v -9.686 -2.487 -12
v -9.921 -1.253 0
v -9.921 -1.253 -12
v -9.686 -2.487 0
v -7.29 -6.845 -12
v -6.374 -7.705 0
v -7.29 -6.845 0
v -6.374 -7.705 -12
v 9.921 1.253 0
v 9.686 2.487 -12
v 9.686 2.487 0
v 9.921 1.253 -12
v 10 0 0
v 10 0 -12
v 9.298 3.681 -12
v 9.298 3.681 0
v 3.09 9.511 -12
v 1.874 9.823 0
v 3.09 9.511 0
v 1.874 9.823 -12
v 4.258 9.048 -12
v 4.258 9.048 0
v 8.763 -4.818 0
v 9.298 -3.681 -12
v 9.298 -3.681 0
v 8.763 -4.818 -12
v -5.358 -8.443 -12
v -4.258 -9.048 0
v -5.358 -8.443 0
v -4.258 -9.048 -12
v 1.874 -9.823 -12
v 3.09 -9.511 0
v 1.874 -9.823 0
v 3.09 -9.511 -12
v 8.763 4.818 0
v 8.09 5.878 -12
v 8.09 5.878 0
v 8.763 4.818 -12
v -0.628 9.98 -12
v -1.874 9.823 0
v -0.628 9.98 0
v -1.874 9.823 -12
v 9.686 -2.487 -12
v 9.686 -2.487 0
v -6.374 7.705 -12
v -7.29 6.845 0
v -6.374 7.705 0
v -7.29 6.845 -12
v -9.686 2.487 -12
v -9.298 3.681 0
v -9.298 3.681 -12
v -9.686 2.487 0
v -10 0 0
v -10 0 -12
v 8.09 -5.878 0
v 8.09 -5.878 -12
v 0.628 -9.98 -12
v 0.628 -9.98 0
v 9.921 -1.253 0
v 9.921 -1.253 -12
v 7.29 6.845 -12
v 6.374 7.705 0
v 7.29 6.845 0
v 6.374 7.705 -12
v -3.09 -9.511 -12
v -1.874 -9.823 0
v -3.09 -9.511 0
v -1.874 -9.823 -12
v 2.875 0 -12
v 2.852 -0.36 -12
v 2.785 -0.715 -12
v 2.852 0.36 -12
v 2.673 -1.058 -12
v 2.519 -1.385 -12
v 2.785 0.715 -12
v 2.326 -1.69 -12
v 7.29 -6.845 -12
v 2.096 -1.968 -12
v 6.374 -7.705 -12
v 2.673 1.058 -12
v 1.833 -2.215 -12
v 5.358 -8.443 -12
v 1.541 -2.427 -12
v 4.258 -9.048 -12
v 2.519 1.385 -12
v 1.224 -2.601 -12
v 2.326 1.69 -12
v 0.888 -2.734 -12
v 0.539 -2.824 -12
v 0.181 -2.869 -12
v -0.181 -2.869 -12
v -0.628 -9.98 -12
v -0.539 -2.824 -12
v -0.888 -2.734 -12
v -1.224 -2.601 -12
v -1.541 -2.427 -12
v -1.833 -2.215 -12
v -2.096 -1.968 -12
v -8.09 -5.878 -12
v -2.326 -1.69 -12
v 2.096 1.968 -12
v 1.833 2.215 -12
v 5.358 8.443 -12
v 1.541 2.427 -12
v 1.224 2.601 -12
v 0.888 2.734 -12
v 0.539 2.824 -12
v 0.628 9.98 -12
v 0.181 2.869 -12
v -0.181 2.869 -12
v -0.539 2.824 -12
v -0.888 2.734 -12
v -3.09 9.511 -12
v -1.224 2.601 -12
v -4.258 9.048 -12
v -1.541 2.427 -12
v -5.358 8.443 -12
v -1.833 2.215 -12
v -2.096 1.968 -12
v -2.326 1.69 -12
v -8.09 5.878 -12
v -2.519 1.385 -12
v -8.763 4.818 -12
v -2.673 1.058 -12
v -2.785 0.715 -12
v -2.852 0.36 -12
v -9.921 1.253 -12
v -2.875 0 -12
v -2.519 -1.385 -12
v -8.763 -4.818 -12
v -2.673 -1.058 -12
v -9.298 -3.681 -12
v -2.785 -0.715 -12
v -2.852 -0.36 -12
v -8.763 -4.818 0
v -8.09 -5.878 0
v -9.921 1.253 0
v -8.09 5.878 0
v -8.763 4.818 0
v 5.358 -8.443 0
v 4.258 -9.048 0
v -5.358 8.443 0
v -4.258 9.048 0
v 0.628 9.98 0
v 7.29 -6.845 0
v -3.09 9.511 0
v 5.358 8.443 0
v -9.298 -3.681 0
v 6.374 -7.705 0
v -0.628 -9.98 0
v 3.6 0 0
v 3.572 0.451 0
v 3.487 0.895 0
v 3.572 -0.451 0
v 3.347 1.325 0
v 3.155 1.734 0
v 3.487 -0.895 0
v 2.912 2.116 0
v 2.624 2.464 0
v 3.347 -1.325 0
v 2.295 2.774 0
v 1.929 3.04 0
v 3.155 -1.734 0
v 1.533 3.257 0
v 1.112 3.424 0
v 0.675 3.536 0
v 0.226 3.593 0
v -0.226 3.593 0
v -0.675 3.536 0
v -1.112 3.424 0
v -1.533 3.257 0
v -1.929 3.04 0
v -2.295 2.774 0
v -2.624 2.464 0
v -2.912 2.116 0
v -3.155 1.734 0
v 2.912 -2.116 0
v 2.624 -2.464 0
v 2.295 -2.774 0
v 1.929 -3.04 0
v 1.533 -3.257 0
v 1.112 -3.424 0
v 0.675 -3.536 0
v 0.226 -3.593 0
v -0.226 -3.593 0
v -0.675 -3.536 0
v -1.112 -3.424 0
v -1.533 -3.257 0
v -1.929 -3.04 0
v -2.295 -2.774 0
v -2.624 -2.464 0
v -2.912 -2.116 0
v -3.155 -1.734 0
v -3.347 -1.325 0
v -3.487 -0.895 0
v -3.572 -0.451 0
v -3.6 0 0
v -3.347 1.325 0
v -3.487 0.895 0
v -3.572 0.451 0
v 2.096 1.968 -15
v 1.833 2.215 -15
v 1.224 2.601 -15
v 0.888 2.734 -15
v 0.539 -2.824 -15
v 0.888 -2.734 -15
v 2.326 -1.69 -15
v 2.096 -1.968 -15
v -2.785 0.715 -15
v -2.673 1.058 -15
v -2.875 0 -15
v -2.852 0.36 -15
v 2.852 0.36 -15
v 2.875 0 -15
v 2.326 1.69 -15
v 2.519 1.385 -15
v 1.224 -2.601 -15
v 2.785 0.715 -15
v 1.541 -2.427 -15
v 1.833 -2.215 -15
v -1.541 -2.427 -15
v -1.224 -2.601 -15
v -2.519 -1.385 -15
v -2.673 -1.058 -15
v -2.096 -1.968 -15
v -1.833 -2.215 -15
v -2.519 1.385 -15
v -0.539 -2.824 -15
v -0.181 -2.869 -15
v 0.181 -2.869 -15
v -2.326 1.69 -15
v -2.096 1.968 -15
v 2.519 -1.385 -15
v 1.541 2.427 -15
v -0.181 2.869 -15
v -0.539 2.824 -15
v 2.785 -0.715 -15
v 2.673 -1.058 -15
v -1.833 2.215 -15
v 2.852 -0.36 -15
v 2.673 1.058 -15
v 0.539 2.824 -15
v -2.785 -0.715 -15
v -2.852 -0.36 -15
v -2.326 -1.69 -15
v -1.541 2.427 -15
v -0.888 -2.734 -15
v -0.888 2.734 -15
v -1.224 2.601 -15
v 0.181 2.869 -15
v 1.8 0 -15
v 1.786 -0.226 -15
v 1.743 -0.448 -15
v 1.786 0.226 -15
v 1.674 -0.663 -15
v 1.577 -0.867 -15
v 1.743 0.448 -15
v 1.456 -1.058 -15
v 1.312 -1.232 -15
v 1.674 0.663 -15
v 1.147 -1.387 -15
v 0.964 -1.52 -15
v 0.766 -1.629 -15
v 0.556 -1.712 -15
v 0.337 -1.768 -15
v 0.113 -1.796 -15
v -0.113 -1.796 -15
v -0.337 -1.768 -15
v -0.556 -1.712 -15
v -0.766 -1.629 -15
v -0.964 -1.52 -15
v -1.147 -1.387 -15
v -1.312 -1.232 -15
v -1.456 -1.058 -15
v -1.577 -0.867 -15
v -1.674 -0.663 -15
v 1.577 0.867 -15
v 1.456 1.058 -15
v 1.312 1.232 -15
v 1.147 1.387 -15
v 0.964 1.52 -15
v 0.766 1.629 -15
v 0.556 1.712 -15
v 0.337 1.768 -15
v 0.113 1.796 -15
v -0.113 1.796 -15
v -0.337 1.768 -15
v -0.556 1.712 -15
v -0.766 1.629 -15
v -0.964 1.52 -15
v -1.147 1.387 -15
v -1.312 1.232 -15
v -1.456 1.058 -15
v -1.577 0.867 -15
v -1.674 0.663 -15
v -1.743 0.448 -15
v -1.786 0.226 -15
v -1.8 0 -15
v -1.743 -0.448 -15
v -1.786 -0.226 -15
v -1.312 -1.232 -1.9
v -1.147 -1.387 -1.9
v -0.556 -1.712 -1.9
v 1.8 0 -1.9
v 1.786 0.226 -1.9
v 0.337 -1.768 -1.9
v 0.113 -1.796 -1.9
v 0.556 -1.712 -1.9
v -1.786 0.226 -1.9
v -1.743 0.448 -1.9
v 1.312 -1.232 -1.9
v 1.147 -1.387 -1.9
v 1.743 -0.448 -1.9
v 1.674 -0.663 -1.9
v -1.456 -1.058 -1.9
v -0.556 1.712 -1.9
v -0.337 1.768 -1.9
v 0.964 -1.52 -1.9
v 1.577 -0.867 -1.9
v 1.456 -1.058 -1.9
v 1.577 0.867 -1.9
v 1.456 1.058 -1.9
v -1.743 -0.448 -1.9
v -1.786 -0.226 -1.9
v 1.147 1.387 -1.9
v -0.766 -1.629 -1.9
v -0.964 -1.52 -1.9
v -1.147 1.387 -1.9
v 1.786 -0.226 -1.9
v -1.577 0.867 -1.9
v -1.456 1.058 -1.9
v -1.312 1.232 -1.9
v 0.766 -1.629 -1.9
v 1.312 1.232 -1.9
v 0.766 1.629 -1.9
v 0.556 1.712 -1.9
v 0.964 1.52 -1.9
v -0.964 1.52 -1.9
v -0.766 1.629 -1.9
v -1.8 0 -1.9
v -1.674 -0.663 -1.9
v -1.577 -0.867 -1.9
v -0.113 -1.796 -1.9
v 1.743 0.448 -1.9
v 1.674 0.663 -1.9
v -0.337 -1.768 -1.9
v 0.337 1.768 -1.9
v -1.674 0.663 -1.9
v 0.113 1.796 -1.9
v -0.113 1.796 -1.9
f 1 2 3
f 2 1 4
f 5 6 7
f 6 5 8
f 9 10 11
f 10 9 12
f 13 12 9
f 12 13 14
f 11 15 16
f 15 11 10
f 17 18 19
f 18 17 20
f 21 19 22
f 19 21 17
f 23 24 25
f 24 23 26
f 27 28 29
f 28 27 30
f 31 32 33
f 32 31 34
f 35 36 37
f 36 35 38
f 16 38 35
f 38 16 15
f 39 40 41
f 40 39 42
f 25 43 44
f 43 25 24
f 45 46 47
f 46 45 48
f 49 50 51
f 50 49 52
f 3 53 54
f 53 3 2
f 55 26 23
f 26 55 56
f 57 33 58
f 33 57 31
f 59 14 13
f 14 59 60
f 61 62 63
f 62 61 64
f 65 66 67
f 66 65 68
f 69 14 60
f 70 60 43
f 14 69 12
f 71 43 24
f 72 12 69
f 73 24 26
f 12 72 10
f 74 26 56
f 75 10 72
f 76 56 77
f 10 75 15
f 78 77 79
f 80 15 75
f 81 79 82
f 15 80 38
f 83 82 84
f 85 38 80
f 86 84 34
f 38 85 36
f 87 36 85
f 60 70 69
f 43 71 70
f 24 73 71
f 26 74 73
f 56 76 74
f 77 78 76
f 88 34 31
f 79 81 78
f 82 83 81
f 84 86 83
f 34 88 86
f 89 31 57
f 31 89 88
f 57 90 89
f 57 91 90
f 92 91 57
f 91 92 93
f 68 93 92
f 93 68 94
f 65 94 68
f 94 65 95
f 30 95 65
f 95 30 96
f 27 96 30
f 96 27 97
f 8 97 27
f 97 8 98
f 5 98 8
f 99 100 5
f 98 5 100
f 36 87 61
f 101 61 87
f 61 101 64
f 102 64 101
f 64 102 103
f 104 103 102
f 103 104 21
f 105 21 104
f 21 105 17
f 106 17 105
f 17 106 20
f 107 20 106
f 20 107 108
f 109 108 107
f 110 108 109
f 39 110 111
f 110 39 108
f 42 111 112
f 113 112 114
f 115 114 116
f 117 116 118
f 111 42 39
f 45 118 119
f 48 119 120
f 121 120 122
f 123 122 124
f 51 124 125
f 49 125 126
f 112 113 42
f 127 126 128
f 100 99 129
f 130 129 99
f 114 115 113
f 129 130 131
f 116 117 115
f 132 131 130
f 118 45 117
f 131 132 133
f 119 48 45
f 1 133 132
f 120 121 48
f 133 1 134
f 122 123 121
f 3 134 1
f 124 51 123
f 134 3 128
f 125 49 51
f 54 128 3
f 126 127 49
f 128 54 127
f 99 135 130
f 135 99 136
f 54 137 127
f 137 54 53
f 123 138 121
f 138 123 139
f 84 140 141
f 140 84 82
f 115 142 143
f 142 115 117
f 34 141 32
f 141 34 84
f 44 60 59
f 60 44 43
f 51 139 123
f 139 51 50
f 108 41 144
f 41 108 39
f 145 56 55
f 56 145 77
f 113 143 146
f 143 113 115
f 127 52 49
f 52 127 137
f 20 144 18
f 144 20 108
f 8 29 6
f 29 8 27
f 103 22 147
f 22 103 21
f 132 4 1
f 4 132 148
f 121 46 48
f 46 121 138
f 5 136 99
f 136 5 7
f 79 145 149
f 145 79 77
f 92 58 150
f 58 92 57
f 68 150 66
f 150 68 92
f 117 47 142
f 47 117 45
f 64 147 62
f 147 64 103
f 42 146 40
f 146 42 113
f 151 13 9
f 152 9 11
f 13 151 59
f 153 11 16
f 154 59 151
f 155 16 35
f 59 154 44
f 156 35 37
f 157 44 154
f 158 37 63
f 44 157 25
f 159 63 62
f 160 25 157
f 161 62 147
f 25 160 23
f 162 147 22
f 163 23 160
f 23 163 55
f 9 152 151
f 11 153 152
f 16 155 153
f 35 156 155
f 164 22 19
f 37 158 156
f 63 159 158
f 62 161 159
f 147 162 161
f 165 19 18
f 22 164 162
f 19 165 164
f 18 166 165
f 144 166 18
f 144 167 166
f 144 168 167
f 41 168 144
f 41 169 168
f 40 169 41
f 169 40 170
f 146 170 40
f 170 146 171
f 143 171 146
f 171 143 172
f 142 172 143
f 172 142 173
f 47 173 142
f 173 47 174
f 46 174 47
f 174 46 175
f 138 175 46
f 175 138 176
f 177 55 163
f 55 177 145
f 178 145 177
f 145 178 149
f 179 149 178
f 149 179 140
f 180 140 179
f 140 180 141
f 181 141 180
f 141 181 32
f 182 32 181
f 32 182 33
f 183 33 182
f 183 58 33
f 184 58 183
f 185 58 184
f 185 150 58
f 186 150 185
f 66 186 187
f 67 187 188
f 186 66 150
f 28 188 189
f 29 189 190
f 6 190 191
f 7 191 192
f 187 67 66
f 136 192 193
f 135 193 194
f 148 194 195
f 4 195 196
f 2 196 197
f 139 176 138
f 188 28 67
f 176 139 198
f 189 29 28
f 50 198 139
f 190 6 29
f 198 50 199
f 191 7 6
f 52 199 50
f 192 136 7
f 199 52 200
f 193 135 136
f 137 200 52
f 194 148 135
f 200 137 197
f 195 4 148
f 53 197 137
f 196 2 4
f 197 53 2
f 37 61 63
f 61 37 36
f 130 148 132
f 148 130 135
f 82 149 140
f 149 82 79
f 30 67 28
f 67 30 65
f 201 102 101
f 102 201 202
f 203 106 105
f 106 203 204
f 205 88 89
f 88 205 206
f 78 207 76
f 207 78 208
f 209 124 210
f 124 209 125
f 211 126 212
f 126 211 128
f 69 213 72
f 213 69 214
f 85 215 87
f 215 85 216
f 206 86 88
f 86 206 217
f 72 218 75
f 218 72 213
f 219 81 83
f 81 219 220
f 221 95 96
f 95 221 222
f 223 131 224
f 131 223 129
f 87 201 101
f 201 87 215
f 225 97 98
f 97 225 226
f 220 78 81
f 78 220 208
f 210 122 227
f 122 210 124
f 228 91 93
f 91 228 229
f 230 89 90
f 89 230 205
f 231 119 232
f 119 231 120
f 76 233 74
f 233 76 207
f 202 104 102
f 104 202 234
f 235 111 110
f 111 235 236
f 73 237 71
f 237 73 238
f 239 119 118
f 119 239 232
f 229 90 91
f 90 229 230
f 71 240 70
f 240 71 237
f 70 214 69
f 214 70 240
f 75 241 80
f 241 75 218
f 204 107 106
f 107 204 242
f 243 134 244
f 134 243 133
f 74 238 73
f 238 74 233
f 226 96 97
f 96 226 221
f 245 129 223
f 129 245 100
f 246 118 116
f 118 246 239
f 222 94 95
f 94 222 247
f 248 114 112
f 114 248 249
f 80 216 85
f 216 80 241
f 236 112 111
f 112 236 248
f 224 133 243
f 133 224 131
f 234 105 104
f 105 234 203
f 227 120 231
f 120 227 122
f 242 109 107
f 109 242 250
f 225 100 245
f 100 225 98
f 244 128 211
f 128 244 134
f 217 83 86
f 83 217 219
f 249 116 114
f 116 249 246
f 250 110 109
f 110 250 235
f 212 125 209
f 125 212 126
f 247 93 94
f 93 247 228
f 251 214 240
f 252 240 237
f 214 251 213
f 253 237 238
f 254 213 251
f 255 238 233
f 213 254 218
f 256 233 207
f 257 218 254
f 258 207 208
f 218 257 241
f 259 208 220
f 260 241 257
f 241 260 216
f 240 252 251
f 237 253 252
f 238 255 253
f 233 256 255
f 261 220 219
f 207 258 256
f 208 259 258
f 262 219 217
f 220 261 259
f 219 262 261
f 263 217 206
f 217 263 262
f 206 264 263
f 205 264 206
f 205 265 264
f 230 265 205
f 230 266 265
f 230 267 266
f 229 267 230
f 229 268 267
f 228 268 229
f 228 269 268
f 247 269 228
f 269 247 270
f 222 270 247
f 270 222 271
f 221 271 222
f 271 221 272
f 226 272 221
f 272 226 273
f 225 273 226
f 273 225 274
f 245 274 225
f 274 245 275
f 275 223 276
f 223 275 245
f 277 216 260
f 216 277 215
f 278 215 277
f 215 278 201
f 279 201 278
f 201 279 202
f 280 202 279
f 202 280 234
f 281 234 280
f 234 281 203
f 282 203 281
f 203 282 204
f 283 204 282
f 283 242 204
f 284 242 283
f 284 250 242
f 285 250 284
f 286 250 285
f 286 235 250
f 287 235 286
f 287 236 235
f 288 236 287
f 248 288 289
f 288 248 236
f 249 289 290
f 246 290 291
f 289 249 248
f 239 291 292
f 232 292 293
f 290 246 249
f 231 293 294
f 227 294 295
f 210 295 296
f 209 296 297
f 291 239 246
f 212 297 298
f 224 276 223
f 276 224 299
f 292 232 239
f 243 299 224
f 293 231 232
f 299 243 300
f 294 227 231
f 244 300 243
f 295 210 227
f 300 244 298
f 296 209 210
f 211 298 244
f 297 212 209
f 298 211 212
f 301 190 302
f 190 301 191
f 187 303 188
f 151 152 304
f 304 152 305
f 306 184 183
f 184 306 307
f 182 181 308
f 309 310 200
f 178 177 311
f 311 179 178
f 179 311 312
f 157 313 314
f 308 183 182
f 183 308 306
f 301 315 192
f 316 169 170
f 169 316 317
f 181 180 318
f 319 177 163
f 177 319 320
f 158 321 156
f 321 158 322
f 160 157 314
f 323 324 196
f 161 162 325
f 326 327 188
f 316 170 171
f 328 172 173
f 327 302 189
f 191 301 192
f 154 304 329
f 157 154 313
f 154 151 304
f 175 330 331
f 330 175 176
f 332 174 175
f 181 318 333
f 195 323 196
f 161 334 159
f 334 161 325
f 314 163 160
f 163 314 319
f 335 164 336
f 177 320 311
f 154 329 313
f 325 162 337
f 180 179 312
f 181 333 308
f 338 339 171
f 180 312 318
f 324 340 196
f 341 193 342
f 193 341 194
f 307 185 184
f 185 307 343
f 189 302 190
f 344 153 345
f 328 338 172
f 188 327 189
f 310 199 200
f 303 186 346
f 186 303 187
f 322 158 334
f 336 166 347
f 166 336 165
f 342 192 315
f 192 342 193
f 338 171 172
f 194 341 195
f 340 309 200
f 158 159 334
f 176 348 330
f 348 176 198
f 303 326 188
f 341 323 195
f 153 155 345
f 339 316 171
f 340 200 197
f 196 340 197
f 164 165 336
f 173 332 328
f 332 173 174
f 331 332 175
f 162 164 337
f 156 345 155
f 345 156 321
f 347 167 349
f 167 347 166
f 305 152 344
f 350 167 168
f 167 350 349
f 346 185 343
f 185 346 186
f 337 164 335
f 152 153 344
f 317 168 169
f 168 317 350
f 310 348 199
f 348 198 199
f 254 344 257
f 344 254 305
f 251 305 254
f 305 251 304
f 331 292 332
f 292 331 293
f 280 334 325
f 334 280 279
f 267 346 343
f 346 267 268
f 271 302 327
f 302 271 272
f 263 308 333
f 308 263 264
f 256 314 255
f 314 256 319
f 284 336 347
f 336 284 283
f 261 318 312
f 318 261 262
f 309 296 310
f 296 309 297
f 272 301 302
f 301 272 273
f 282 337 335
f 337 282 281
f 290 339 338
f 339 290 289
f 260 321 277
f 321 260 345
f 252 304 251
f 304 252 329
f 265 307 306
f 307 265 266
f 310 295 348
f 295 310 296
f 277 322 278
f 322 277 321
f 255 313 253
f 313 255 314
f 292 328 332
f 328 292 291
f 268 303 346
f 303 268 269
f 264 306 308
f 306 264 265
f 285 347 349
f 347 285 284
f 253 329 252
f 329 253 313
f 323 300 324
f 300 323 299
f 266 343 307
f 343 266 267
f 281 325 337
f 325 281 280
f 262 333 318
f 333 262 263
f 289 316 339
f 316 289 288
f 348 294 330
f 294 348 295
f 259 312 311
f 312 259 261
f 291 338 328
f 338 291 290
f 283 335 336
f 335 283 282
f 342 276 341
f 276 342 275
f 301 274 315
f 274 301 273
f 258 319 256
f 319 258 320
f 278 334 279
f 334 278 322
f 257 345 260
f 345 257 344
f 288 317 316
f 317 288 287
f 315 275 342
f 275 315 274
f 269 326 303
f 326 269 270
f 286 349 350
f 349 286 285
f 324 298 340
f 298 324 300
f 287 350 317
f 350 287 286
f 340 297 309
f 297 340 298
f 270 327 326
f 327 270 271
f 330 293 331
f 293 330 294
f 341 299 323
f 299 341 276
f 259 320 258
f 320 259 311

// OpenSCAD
$fn = 50;


difference() {
	union() {
		translate(v = [0, 0, -12.0000000000]) {
			cylinder(h = 12, r = 10.0000000000);
		}
		#translate(v = [0, 0, -15.0000000000]) {
			cylinder(h = 15, r = 2.8750000000);
		}
	}
	union() {
		translate(v = [0, 0, 0]) {
			rotate(a = [0, 0, 0]) {
				difference() {
					union() {
						translate(v = [0, 0, -15.0000000000]) {
							cylinder(h = 15, r = 1.5000000000);
						}
						translate(v = [0, 0, -1.9000000000]) {
							cylinder(h = 1.9000000000, r1 = 1.8000000000, r2 = 3.6000000000);
						}
						translate(v = [0, 0, -15.0000000000]) {
							cylinder(h = 15, r = 1.8000000000);
						}
						translate(v = [0, 0, -15.0000000000]) {
							cylinder(h = 15, r = 1.5000000000);
						}
					}
					union();
				}
			}
		}
	}
}
